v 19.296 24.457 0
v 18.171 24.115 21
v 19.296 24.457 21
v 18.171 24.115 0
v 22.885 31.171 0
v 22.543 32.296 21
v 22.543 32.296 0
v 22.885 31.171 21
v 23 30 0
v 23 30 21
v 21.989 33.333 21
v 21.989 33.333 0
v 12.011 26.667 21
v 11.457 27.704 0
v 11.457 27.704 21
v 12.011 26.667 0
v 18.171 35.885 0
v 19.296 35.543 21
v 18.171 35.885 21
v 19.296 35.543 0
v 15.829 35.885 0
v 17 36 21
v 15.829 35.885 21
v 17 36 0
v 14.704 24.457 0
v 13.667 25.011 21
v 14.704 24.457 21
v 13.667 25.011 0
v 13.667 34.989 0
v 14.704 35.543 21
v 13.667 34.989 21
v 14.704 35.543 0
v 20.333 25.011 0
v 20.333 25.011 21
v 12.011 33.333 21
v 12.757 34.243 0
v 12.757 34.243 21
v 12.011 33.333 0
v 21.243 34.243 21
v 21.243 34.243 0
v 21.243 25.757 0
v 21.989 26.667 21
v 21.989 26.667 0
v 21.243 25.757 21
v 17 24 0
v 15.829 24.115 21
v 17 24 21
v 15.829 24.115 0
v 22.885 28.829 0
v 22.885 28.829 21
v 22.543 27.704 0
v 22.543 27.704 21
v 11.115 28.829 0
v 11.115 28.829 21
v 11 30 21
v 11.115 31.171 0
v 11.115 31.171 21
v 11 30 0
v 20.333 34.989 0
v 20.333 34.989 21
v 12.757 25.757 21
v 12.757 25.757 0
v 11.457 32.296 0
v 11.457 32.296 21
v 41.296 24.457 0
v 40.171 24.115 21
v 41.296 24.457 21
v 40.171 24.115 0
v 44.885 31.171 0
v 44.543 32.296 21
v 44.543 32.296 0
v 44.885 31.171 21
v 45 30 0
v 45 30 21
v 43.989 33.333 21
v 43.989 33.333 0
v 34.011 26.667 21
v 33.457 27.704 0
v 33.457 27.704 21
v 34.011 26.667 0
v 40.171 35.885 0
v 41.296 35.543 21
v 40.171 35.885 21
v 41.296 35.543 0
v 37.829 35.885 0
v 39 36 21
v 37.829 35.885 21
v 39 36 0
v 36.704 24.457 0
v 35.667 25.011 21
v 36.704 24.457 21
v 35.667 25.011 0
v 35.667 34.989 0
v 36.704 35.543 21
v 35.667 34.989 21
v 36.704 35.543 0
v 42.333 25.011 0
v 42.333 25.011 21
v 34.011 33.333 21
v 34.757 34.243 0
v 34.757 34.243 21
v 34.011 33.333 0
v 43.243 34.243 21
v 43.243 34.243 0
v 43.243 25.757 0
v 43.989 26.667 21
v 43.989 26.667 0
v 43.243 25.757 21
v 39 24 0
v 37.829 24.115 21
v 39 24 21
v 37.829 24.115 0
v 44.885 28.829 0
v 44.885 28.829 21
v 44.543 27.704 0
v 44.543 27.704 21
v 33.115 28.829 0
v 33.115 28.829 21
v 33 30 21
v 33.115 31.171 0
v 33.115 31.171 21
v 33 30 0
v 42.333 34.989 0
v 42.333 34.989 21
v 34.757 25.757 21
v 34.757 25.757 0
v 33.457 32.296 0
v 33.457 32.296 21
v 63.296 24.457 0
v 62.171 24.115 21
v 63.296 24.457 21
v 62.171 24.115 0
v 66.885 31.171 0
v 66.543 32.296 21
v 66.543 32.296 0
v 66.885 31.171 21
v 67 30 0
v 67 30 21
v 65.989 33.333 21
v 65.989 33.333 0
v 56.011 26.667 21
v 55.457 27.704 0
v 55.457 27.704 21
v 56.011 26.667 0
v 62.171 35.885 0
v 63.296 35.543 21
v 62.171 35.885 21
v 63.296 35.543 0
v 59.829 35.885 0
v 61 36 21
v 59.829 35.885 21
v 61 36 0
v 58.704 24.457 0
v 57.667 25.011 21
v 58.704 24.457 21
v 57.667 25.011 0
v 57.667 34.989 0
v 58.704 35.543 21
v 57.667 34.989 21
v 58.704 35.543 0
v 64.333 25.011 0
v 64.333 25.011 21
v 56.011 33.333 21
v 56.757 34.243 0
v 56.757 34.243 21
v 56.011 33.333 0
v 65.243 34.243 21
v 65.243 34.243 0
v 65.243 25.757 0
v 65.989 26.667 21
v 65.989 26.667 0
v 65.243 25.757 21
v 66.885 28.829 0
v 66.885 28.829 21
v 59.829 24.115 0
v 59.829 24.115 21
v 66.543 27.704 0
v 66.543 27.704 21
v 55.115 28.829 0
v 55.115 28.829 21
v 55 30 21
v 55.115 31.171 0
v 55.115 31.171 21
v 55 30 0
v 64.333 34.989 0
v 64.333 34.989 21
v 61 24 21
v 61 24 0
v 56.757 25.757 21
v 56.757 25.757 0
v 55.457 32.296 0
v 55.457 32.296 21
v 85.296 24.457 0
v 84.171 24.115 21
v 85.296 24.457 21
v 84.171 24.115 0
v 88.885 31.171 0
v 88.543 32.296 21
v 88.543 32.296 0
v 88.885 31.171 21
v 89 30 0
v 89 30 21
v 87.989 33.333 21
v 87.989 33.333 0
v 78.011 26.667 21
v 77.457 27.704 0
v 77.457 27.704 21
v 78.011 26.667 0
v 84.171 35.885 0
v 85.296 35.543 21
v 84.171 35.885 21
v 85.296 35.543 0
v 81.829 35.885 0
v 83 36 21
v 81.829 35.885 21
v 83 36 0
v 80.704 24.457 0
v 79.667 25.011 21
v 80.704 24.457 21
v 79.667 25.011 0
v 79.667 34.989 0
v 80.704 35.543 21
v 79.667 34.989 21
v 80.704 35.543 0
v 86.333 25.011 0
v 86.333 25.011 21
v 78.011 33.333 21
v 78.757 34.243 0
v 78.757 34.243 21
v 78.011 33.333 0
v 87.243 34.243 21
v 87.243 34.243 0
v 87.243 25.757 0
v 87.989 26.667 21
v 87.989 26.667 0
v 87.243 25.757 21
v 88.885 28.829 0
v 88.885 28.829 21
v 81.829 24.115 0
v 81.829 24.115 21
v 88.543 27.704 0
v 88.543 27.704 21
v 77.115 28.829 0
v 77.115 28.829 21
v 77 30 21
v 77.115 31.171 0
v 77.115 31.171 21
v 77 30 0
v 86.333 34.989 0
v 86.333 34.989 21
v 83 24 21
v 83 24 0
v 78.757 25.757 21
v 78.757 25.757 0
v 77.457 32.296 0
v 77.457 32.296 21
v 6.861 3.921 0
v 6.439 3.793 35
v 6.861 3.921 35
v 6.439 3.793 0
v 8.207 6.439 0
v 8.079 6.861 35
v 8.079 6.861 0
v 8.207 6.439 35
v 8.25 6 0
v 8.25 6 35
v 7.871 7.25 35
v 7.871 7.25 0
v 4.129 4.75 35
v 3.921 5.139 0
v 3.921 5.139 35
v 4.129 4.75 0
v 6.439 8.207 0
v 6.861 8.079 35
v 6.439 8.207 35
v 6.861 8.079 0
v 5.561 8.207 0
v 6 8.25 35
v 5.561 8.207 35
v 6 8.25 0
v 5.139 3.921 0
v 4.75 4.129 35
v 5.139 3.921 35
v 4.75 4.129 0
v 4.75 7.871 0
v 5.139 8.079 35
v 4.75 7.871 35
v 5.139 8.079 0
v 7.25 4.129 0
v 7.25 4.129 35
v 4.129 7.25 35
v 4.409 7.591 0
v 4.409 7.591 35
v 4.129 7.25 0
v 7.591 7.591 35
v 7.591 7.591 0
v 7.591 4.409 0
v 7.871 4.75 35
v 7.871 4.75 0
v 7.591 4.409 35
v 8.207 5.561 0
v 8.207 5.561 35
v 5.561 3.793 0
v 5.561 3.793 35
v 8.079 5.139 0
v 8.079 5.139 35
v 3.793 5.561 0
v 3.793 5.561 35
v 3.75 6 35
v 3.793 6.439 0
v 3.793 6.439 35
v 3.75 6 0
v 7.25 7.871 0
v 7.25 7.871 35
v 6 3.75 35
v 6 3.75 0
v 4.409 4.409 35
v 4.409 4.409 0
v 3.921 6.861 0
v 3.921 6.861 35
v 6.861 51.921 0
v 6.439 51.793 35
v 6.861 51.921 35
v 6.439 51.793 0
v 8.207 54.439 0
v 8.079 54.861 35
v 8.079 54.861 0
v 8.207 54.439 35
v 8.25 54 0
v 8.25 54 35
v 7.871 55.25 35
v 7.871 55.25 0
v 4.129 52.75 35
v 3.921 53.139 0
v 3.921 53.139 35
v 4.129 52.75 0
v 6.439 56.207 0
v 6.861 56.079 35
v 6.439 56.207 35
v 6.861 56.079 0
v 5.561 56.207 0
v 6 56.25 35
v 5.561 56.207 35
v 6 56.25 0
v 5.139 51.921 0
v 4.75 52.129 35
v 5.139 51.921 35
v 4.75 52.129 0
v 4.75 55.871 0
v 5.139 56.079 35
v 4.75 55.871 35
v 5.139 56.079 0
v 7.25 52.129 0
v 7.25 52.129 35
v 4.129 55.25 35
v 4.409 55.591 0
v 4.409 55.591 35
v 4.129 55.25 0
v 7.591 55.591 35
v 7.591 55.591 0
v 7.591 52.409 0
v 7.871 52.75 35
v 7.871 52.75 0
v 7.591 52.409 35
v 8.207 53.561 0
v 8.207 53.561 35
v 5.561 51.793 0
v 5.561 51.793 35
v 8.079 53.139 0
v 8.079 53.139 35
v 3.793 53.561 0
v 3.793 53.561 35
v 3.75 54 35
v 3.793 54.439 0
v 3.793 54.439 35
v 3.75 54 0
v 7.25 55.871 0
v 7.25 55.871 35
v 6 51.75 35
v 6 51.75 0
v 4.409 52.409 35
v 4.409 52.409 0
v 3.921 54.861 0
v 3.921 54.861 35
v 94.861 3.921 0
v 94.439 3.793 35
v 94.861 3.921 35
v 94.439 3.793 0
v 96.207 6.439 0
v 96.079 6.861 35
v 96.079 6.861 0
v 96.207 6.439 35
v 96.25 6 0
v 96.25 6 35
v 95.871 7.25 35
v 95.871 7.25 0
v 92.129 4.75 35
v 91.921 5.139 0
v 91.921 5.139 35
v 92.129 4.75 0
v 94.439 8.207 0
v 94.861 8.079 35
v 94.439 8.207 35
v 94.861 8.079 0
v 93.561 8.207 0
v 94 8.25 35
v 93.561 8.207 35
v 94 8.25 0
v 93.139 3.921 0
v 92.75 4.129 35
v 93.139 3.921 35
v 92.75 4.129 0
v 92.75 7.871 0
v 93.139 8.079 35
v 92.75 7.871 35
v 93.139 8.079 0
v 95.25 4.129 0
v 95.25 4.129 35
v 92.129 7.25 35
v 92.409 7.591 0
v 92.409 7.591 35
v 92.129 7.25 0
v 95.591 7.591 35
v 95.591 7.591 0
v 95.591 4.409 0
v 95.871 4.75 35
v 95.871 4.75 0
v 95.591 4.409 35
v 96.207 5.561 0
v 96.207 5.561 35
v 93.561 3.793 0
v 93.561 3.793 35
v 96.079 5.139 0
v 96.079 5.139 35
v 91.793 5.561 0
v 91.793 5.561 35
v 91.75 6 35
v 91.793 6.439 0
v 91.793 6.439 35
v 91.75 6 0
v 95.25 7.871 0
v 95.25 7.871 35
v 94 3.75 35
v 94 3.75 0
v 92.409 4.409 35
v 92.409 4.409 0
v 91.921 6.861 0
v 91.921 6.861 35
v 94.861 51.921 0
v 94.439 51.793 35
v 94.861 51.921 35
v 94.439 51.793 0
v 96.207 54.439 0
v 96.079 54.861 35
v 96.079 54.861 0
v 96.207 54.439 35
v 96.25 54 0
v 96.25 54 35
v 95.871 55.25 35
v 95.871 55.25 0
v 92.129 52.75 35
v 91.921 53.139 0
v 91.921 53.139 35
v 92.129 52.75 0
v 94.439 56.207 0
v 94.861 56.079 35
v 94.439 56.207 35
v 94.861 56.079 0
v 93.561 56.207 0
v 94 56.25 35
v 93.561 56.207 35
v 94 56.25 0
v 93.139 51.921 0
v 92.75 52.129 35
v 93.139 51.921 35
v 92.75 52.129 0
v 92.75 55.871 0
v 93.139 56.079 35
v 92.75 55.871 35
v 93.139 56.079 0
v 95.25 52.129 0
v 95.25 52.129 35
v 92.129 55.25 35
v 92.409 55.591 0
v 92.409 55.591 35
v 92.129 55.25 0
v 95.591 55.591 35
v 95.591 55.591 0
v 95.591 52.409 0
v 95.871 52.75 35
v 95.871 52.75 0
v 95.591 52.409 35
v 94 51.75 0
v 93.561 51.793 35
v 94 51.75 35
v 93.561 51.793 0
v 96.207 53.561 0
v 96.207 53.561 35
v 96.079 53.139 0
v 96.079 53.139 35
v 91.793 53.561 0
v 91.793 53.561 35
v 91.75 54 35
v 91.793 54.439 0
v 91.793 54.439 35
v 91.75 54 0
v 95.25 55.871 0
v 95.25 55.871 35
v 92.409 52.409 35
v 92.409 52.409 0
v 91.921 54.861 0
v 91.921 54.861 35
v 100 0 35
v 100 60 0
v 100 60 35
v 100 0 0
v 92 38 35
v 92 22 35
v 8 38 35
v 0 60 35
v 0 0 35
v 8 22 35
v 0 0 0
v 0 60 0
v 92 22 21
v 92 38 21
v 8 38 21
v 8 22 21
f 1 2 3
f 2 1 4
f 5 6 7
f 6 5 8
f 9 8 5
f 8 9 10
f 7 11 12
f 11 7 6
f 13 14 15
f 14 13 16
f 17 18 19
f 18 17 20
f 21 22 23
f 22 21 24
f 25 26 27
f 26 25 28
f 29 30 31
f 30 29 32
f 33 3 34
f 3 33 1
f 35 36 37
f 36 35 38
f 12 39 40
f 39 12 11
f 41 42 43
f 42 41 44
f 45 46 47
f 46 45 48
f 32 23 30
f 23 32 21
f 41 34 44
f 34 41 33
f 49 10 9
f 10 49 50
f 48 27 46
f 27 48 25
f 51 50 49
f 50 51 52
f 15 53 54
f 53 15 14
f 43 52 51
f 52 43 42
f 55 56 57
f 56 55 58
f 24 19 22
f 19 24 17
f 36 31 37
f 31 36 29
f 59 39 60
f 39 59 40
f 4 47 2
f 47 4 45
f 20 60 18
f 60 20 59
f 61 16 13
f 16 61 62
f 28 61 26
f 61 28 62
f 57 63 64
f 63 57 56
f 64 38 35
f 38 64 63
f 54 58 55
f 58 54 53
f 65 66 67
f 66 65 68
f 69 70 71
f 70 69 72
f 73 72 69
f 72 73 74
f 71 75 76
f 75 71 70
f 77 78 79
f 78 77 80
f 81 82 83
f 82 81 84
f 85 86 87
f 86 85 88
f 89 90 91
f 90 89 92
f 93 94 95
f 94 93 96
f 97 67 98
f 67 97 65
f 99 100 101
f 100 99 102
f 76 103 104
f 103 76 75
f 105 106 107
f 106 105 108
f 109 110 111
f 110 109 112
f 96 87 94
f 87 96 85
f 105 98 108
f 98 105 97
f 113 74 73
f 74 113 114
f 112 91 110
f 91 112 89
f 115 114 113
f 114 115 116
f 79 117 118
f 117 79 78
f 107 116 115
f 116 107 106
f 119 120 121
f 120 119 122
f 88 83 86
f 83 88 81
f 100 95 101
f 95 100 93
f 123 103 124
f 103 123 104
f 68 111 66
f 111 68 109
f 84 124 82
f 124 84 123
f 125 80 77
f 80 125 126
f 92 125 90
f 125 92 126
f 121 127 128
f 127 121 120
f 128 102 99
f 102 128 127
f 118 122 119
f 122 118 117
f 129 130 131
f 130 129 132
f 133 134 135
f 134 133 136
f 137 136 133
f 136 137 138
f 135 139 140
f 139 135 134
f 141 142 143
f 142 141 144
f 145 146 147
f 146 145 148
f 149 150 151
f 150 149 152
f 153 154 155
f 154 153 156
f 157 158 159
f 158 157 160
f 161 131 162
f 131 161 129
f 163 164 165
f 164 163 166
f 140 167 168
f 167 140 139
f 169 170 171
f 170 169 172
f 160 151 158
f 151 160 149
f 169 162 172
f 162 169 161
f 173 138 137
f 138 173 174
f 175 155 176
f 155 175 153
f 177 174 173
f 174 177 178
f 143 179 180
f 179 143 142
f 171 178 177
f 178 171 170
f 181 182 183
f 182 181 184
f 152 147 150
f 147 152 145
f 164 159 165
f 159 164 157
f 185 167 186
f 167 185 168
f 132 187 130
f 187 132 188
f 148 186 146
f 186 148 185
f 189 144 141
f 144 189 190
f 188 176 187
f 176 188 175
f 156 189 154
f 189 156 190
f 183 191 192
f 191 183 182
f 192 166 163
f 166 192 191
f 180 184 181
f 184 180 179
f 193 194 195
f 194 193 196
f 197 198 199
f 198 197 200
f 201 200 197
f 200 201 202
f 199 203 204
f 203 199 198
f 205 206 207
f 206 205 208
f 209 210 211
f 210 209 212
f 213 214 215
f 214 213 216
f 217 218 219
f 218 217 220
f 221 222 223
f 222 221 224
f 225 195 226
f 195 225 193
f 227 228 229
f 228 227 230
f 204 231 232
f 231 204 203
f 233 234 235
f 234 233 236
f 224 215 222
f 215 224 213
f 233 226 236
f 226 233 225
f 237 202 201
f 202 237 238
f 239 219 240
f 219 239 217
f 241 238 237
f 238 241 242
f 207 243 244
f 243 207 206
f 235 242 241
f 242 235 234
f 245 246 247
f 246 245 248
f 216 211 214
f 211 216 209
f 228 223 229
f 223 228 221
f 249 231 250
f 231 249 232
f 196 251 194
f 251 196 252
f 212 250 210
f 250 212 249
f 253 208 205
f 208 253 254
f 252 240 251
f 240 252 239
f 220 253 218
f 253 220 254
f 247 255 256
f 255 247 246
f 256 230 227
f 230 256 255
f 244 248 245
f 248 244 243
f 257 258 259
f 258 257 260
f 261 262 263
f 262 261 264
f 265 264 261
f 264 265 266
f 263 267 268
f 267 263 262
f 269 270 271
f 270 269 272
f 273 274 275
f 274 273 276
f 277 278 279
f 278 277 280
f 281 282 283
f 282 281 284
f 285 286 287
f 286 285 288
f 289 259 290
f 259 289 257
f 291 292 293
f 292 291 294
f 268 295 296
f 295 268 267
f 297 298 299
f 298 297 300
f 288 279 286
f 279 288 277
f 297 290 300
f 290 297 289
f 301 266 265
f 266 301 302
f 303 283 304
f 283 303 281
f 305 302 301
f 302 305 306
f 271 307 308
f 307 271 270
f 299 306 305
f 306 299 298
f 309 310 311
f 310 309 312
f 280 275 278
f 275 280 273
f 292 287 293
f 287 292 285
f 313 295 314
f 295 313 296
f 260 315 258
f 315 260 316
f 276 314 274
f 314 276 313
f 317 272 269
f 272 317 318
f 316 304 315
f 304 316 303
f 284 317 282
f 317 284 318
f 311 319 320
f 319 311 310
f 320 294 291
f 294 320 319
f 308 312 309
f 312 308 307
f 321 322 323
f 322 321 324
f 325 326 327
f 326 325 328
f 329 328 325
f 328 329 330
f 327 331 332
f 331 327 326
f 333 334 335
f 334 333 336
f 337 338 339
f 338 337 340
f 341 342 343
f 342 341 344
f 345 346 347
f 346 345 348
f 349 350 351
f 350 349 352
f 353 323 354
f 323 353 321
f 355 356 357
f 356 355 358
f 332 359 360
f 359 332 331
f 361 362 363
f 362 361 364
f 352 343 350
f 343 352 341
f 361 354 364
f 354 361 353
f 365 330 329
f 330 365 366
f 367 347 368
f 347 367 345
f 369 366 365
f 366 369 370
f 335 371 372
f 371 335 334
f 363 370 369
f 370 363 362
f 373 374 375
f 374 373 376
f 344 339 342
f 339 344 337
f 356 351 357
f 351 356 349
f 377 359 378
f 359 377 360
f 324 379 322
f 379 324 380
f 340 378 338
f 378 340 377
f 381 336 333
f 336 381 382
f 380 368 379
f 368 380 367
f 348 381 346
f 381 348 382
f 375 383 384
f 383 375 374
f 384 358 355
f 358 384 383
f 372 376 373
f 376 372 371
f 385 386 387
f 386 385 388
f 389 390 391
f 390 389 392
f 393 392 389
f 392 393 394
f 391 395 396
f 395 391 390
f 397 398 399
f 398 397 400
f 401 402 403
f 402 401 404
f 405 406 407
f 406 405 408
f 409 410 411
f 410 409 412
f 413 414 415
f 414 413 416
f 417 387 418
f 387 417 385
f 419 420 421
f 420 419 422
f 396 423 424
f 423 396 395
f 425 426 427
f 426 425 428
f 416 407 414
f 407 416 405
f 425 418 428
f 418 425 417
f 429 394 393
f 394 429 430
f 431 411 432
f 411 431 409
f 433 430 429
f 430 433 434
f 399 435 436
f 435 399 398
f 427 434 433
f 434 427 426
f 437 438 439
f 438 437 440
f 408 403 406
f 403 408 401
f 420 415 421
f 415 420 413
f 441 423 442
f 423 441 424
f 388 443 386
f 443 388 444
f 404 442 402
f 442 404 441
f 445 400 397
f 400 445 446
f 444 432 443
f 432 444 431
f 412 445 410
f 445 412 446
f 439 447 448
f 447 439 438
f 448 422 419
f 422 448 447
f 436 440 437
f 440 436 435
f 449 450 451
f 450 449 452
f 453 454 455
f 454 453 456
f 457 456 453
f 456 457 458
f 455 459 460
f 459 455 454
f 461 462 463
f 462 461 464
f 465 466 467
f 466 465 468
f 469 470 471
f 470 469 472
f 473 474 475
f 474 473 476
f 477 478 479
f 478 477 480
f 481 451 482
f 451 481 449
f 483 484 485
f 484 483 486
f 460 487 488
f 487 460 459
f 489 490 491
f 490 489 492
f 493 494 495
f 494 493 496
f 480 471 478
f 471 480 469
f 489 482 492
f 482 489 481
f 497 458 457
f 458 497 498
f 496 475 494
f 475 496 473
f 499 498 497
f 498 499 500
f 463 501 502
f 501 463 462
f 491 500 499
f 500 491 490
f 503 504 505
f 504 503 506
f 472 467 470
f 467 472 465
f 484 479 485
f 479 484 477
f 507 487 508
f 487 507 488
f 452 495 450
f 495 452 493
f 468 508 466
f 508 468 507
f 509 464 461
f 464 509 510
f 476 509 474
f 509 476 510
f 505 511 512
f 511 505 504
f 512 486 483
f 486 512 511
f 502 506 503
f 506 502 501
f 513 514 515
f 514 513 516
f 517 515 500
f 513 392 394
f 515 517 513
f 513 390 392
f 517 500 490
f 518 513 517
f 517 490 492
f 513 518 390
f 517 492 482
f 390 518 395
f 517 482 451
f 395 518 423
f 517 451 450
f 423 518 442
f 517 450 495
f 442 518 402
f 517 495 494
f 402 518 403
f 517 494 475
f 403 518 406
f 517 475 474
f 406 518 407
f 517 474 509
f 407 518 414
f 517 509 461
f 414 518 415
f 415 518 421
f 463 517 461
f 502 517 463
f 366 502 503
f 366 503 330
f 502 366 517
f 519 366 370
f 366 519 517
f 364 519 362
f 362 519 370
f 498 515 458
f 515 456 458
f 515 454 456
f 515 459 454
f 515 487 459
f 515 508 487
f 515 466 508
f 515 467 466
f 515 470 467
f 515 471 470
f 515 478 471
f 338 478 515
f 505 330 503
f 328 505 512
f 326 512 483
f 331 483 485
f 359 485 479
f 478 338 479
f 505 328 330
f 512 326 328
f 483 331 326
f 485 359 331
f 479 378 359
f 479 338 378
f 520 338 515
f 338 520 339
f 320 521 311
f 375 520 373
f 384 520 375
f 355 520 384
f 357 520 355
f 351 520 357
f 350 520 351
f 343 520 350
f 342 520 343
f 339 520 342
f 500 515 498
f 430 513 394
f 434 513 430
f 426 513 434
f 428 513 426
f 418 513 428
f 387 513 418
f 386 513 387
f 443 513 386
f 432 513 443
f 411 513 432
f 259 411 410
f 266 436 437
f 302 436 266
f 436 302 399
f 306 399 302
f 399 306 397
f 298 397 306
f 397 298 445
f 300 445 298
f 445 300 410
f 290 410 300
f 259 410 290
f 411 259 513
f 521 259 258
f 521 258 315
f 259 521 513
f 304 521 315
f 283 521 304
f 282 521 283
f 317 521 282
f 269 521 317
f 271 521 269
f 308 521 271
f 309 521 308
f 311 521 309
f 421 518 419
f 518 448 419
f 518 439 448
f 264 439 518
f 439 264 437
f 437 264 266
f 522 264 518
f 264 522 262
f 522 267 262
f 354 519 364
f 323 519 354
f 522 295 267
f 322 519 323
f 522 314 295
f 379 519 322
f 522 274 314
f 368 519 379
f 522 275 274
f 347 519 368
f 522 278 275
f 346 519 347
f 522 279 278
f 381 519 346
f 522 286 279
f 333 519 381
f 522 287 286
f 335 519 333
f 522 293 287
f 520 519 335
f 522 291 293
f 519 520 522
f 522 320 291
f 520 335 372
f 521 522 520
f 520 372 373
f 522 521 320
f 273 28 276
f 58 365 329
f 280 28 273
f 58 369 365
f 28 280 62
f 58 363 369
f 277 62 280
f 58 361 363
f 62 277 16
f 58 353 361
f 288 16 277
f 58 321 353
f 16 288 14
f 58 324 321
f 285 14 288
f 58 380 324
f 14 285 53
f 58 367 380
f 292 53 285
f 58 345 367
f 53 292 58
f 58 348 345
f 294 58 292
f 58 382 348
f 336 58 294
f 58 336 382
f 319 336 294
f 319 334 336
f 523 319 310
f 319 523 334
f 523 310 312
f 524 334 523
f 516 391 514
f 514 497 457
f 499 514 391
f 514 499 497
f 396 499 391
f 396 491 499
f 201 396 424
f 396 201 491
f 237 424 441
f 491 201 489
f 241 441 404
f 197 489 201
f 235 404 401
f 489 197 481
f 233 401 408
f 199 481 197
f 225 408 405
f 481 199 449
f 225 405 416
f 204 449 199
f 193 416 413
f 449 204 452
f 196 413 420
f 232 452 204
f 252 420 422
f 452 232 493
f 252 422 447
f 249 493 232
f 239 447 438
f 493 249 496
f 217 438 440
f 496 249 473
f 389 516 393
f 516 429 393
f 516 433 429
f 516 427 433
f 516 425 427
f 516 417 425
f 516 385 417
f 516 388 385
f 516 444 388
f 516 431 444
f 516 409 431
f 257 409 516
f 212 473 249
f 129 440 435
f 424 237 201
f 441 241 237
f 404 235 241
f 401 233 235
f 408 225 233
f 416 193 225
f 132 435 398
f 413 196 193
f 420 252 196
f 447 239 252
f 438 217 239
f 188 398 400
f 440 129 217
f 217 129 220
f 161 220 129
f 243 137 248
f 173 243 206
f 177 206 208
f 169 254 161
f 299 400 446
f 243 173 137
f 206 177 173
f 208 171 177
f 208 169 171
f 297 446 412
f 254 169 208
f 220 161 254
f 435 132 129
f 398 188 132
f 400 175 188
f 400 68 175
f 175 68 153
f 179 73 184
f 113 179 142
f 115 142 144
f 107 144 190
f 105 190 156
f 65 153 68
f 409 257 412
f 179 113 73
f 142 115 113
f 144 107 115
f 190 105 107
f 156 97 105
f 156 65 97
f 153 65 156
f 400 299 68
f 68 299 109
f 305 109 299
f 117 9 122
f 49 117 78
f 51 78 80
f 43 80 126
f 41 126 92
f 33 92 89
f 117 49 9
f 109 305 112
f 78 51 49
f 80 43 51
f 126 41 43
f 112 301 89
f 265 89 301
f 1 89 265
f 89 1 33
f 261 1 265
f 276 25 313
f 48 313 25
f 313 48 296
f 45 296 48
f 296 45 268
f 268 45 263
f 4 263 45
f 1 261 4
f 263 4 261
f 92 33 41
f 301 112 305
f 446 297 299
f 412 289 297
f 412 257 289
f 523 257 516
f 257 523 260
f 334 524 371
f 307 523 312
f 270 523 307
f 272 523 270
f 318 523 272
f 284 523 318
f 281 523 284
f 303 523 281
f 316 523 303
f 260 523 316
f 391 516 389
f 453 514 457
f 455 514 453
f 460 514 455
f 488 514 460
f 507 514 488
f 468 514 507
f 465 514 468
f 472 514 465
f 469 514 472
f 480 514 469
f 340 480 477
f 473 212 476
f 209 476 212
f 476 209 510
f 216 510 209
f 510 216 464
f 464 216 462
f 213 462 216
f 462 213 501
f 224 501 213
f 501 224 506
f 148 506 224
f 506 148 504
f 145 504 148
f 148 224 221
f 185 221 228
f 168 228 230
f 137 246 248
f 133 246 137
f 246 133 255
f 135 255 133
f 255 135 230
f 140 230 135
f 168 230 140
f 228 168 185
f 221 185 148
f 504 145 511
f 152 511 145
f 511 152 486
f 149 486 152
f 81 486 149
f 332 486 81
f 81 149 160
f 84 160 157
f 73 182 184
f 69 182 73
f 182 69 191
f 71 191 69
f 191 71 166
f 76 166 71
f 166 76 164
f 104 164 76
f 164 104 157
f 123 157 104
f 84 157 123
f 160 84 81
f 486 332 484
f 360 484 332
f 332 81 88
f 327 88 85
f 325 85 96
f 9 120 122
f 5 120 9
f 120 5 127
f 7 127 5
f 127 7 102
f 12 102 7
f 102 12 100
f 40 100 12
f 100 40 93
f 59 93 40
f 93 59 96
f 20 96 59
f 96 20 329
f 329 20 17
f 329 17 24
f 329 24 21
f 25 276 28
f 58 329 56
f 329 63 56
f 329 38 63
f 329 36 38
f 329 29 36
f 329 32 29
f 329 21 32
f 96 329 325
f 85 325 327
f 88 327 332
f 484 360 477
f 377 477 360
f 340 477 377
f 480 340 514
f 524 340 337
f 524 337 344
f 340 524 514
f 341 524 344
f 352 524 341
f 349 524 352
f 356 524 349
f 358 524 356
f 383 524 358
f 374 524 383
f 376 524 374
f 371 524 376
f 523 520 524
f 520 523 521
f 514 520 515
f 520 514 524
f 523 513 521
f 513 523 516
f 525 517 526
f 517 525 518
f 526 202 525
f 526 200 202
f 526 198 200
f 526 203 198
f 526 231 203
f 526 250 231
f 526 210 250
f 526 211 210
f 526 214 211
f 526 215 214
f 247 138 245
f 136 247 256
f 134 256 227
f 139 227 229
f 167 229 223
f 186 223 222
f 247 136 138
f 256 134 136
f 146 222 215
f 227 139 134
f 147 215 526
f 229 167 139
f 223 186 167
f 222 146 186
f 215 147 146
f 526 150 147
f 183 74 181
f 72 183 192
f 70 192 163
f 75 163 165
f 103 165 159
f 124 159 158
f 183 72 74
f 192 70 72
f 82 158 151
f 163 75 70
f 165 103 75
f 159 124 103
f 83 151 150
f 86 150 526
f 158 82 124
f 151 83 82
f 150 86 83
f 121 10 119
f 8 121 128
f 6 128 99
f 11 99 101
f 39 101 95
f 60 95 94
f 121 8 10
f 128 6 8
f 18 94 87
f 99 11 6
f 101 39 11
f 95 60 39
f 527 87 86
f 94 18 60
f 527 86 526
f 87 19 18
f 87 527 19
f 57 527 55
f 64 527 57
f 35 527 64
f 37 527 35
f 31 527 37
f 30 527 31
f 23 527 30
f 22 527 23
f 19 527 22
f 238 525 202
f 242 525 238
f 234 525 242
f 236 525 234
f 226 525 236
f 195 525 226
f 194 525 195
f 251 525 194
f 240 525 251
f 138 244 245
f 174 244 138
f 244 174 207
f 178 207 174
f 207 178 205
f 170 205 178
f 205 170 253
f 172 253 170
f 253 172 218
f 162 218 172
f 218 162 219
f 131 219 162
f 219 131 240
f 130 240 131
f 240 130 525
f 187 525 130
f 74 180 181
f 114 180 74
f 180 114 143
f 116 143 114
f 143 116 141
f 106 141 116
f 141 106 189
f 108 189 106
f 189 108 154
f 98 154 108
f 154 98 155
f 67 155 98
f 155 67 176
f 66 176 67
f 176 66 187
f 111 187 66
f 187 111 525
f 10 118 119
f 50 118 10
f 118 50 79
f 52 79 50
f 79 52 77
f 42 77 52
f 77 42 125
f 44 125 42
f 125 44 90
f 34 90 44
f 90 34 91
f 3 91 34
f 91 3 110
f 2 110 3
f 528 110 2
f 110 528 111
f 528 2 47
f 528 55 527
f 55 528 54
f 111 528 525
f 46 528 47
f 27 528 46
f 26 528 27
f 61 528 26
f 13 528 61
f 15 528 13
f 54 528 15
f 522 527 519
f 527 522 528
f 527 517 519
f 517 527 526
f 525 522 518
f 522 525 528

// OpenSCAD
$fn = 32;

// ----------------------------------------------------------------------
// Manifold block: gallery_top manifold
// ----------------------------------------------------------------------

// --- parameters (mm) ---
block_l = 100;            // block length, X
block_w = 60;             // block width, Y
block_h = 35;             // block height, Z
port_d = 12;              // port bore diameter
port_pitch = 22;          // port pitch along X
gallery_d = 16;           // top gallery width, Y
gallery_depth = 14;       // gallery pocket depth
wall_p = 8;               // gallery end wall thickness, X
mnt_d = 4.5;              // mounting hole diameter
mnt_in = 6;               // mounting hole inset from the edges

n_ports = 4;  // ports in the row
port_x0 = (block_l - (n_ports - 1) * port_pitch) / 2;  // first port X

difference() {
  cube([block_l, block_w, block_h]);
  for (i = [0 : n_ports - 1])
    translate([port_x0 + i * port_pitch, block_w / 2, -1])
      cylinder(h = block_h + 2, d = port_d);
  translate([wall_p, block_w / 2 - gallery_d / 2, block_h - gallery_depth])
    cube([block_l - 2 * wall_p, gallery_d, gallery_depth + 1]);
  for (cx = [mnt_in, block_l - mnt_in])
    for (cy = [mnt_in, block_w - mnt_in])
      translate([cx, cy, -1]) cylinder(h = block_h + 2, d = mnt_d);
}
